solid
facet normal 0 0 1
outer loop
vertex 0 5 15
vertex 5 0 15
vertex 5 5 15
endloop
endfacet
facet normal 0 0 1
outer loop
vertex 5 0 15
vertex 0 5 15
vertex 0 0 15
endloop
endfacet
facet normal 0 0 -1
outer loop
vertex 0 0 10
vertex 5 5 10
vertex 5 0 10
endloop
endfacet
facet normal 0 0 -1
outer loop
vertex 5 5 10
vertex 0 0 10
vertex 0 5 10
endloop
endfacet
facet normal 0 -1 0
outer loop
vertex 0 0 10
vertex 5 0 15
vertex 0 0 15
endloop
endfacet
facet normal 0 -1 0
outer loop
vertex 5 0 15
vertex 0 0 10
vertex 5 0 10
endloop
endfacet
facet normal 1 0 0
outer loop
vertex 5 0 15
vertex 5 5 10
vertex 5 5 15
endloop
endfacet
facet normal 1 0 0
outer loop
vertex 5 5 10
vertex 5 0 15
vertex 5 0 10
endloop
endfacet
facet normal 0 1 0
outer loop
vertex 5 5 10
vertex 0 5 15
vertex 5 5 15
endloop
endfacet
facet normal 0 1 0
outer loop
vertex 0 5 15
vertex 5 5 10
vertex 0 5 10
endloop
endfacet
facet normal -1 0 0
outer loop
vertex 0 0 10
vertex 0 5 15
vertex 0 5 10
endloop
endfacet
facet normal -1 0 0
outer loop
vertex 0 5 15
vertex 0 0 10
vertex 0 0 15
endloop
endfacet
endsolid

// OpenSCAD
// BOSL-style up() transform using children()
module up(z) {
    translate([0, 0, z]) children();
}

up(10) cube(5);
